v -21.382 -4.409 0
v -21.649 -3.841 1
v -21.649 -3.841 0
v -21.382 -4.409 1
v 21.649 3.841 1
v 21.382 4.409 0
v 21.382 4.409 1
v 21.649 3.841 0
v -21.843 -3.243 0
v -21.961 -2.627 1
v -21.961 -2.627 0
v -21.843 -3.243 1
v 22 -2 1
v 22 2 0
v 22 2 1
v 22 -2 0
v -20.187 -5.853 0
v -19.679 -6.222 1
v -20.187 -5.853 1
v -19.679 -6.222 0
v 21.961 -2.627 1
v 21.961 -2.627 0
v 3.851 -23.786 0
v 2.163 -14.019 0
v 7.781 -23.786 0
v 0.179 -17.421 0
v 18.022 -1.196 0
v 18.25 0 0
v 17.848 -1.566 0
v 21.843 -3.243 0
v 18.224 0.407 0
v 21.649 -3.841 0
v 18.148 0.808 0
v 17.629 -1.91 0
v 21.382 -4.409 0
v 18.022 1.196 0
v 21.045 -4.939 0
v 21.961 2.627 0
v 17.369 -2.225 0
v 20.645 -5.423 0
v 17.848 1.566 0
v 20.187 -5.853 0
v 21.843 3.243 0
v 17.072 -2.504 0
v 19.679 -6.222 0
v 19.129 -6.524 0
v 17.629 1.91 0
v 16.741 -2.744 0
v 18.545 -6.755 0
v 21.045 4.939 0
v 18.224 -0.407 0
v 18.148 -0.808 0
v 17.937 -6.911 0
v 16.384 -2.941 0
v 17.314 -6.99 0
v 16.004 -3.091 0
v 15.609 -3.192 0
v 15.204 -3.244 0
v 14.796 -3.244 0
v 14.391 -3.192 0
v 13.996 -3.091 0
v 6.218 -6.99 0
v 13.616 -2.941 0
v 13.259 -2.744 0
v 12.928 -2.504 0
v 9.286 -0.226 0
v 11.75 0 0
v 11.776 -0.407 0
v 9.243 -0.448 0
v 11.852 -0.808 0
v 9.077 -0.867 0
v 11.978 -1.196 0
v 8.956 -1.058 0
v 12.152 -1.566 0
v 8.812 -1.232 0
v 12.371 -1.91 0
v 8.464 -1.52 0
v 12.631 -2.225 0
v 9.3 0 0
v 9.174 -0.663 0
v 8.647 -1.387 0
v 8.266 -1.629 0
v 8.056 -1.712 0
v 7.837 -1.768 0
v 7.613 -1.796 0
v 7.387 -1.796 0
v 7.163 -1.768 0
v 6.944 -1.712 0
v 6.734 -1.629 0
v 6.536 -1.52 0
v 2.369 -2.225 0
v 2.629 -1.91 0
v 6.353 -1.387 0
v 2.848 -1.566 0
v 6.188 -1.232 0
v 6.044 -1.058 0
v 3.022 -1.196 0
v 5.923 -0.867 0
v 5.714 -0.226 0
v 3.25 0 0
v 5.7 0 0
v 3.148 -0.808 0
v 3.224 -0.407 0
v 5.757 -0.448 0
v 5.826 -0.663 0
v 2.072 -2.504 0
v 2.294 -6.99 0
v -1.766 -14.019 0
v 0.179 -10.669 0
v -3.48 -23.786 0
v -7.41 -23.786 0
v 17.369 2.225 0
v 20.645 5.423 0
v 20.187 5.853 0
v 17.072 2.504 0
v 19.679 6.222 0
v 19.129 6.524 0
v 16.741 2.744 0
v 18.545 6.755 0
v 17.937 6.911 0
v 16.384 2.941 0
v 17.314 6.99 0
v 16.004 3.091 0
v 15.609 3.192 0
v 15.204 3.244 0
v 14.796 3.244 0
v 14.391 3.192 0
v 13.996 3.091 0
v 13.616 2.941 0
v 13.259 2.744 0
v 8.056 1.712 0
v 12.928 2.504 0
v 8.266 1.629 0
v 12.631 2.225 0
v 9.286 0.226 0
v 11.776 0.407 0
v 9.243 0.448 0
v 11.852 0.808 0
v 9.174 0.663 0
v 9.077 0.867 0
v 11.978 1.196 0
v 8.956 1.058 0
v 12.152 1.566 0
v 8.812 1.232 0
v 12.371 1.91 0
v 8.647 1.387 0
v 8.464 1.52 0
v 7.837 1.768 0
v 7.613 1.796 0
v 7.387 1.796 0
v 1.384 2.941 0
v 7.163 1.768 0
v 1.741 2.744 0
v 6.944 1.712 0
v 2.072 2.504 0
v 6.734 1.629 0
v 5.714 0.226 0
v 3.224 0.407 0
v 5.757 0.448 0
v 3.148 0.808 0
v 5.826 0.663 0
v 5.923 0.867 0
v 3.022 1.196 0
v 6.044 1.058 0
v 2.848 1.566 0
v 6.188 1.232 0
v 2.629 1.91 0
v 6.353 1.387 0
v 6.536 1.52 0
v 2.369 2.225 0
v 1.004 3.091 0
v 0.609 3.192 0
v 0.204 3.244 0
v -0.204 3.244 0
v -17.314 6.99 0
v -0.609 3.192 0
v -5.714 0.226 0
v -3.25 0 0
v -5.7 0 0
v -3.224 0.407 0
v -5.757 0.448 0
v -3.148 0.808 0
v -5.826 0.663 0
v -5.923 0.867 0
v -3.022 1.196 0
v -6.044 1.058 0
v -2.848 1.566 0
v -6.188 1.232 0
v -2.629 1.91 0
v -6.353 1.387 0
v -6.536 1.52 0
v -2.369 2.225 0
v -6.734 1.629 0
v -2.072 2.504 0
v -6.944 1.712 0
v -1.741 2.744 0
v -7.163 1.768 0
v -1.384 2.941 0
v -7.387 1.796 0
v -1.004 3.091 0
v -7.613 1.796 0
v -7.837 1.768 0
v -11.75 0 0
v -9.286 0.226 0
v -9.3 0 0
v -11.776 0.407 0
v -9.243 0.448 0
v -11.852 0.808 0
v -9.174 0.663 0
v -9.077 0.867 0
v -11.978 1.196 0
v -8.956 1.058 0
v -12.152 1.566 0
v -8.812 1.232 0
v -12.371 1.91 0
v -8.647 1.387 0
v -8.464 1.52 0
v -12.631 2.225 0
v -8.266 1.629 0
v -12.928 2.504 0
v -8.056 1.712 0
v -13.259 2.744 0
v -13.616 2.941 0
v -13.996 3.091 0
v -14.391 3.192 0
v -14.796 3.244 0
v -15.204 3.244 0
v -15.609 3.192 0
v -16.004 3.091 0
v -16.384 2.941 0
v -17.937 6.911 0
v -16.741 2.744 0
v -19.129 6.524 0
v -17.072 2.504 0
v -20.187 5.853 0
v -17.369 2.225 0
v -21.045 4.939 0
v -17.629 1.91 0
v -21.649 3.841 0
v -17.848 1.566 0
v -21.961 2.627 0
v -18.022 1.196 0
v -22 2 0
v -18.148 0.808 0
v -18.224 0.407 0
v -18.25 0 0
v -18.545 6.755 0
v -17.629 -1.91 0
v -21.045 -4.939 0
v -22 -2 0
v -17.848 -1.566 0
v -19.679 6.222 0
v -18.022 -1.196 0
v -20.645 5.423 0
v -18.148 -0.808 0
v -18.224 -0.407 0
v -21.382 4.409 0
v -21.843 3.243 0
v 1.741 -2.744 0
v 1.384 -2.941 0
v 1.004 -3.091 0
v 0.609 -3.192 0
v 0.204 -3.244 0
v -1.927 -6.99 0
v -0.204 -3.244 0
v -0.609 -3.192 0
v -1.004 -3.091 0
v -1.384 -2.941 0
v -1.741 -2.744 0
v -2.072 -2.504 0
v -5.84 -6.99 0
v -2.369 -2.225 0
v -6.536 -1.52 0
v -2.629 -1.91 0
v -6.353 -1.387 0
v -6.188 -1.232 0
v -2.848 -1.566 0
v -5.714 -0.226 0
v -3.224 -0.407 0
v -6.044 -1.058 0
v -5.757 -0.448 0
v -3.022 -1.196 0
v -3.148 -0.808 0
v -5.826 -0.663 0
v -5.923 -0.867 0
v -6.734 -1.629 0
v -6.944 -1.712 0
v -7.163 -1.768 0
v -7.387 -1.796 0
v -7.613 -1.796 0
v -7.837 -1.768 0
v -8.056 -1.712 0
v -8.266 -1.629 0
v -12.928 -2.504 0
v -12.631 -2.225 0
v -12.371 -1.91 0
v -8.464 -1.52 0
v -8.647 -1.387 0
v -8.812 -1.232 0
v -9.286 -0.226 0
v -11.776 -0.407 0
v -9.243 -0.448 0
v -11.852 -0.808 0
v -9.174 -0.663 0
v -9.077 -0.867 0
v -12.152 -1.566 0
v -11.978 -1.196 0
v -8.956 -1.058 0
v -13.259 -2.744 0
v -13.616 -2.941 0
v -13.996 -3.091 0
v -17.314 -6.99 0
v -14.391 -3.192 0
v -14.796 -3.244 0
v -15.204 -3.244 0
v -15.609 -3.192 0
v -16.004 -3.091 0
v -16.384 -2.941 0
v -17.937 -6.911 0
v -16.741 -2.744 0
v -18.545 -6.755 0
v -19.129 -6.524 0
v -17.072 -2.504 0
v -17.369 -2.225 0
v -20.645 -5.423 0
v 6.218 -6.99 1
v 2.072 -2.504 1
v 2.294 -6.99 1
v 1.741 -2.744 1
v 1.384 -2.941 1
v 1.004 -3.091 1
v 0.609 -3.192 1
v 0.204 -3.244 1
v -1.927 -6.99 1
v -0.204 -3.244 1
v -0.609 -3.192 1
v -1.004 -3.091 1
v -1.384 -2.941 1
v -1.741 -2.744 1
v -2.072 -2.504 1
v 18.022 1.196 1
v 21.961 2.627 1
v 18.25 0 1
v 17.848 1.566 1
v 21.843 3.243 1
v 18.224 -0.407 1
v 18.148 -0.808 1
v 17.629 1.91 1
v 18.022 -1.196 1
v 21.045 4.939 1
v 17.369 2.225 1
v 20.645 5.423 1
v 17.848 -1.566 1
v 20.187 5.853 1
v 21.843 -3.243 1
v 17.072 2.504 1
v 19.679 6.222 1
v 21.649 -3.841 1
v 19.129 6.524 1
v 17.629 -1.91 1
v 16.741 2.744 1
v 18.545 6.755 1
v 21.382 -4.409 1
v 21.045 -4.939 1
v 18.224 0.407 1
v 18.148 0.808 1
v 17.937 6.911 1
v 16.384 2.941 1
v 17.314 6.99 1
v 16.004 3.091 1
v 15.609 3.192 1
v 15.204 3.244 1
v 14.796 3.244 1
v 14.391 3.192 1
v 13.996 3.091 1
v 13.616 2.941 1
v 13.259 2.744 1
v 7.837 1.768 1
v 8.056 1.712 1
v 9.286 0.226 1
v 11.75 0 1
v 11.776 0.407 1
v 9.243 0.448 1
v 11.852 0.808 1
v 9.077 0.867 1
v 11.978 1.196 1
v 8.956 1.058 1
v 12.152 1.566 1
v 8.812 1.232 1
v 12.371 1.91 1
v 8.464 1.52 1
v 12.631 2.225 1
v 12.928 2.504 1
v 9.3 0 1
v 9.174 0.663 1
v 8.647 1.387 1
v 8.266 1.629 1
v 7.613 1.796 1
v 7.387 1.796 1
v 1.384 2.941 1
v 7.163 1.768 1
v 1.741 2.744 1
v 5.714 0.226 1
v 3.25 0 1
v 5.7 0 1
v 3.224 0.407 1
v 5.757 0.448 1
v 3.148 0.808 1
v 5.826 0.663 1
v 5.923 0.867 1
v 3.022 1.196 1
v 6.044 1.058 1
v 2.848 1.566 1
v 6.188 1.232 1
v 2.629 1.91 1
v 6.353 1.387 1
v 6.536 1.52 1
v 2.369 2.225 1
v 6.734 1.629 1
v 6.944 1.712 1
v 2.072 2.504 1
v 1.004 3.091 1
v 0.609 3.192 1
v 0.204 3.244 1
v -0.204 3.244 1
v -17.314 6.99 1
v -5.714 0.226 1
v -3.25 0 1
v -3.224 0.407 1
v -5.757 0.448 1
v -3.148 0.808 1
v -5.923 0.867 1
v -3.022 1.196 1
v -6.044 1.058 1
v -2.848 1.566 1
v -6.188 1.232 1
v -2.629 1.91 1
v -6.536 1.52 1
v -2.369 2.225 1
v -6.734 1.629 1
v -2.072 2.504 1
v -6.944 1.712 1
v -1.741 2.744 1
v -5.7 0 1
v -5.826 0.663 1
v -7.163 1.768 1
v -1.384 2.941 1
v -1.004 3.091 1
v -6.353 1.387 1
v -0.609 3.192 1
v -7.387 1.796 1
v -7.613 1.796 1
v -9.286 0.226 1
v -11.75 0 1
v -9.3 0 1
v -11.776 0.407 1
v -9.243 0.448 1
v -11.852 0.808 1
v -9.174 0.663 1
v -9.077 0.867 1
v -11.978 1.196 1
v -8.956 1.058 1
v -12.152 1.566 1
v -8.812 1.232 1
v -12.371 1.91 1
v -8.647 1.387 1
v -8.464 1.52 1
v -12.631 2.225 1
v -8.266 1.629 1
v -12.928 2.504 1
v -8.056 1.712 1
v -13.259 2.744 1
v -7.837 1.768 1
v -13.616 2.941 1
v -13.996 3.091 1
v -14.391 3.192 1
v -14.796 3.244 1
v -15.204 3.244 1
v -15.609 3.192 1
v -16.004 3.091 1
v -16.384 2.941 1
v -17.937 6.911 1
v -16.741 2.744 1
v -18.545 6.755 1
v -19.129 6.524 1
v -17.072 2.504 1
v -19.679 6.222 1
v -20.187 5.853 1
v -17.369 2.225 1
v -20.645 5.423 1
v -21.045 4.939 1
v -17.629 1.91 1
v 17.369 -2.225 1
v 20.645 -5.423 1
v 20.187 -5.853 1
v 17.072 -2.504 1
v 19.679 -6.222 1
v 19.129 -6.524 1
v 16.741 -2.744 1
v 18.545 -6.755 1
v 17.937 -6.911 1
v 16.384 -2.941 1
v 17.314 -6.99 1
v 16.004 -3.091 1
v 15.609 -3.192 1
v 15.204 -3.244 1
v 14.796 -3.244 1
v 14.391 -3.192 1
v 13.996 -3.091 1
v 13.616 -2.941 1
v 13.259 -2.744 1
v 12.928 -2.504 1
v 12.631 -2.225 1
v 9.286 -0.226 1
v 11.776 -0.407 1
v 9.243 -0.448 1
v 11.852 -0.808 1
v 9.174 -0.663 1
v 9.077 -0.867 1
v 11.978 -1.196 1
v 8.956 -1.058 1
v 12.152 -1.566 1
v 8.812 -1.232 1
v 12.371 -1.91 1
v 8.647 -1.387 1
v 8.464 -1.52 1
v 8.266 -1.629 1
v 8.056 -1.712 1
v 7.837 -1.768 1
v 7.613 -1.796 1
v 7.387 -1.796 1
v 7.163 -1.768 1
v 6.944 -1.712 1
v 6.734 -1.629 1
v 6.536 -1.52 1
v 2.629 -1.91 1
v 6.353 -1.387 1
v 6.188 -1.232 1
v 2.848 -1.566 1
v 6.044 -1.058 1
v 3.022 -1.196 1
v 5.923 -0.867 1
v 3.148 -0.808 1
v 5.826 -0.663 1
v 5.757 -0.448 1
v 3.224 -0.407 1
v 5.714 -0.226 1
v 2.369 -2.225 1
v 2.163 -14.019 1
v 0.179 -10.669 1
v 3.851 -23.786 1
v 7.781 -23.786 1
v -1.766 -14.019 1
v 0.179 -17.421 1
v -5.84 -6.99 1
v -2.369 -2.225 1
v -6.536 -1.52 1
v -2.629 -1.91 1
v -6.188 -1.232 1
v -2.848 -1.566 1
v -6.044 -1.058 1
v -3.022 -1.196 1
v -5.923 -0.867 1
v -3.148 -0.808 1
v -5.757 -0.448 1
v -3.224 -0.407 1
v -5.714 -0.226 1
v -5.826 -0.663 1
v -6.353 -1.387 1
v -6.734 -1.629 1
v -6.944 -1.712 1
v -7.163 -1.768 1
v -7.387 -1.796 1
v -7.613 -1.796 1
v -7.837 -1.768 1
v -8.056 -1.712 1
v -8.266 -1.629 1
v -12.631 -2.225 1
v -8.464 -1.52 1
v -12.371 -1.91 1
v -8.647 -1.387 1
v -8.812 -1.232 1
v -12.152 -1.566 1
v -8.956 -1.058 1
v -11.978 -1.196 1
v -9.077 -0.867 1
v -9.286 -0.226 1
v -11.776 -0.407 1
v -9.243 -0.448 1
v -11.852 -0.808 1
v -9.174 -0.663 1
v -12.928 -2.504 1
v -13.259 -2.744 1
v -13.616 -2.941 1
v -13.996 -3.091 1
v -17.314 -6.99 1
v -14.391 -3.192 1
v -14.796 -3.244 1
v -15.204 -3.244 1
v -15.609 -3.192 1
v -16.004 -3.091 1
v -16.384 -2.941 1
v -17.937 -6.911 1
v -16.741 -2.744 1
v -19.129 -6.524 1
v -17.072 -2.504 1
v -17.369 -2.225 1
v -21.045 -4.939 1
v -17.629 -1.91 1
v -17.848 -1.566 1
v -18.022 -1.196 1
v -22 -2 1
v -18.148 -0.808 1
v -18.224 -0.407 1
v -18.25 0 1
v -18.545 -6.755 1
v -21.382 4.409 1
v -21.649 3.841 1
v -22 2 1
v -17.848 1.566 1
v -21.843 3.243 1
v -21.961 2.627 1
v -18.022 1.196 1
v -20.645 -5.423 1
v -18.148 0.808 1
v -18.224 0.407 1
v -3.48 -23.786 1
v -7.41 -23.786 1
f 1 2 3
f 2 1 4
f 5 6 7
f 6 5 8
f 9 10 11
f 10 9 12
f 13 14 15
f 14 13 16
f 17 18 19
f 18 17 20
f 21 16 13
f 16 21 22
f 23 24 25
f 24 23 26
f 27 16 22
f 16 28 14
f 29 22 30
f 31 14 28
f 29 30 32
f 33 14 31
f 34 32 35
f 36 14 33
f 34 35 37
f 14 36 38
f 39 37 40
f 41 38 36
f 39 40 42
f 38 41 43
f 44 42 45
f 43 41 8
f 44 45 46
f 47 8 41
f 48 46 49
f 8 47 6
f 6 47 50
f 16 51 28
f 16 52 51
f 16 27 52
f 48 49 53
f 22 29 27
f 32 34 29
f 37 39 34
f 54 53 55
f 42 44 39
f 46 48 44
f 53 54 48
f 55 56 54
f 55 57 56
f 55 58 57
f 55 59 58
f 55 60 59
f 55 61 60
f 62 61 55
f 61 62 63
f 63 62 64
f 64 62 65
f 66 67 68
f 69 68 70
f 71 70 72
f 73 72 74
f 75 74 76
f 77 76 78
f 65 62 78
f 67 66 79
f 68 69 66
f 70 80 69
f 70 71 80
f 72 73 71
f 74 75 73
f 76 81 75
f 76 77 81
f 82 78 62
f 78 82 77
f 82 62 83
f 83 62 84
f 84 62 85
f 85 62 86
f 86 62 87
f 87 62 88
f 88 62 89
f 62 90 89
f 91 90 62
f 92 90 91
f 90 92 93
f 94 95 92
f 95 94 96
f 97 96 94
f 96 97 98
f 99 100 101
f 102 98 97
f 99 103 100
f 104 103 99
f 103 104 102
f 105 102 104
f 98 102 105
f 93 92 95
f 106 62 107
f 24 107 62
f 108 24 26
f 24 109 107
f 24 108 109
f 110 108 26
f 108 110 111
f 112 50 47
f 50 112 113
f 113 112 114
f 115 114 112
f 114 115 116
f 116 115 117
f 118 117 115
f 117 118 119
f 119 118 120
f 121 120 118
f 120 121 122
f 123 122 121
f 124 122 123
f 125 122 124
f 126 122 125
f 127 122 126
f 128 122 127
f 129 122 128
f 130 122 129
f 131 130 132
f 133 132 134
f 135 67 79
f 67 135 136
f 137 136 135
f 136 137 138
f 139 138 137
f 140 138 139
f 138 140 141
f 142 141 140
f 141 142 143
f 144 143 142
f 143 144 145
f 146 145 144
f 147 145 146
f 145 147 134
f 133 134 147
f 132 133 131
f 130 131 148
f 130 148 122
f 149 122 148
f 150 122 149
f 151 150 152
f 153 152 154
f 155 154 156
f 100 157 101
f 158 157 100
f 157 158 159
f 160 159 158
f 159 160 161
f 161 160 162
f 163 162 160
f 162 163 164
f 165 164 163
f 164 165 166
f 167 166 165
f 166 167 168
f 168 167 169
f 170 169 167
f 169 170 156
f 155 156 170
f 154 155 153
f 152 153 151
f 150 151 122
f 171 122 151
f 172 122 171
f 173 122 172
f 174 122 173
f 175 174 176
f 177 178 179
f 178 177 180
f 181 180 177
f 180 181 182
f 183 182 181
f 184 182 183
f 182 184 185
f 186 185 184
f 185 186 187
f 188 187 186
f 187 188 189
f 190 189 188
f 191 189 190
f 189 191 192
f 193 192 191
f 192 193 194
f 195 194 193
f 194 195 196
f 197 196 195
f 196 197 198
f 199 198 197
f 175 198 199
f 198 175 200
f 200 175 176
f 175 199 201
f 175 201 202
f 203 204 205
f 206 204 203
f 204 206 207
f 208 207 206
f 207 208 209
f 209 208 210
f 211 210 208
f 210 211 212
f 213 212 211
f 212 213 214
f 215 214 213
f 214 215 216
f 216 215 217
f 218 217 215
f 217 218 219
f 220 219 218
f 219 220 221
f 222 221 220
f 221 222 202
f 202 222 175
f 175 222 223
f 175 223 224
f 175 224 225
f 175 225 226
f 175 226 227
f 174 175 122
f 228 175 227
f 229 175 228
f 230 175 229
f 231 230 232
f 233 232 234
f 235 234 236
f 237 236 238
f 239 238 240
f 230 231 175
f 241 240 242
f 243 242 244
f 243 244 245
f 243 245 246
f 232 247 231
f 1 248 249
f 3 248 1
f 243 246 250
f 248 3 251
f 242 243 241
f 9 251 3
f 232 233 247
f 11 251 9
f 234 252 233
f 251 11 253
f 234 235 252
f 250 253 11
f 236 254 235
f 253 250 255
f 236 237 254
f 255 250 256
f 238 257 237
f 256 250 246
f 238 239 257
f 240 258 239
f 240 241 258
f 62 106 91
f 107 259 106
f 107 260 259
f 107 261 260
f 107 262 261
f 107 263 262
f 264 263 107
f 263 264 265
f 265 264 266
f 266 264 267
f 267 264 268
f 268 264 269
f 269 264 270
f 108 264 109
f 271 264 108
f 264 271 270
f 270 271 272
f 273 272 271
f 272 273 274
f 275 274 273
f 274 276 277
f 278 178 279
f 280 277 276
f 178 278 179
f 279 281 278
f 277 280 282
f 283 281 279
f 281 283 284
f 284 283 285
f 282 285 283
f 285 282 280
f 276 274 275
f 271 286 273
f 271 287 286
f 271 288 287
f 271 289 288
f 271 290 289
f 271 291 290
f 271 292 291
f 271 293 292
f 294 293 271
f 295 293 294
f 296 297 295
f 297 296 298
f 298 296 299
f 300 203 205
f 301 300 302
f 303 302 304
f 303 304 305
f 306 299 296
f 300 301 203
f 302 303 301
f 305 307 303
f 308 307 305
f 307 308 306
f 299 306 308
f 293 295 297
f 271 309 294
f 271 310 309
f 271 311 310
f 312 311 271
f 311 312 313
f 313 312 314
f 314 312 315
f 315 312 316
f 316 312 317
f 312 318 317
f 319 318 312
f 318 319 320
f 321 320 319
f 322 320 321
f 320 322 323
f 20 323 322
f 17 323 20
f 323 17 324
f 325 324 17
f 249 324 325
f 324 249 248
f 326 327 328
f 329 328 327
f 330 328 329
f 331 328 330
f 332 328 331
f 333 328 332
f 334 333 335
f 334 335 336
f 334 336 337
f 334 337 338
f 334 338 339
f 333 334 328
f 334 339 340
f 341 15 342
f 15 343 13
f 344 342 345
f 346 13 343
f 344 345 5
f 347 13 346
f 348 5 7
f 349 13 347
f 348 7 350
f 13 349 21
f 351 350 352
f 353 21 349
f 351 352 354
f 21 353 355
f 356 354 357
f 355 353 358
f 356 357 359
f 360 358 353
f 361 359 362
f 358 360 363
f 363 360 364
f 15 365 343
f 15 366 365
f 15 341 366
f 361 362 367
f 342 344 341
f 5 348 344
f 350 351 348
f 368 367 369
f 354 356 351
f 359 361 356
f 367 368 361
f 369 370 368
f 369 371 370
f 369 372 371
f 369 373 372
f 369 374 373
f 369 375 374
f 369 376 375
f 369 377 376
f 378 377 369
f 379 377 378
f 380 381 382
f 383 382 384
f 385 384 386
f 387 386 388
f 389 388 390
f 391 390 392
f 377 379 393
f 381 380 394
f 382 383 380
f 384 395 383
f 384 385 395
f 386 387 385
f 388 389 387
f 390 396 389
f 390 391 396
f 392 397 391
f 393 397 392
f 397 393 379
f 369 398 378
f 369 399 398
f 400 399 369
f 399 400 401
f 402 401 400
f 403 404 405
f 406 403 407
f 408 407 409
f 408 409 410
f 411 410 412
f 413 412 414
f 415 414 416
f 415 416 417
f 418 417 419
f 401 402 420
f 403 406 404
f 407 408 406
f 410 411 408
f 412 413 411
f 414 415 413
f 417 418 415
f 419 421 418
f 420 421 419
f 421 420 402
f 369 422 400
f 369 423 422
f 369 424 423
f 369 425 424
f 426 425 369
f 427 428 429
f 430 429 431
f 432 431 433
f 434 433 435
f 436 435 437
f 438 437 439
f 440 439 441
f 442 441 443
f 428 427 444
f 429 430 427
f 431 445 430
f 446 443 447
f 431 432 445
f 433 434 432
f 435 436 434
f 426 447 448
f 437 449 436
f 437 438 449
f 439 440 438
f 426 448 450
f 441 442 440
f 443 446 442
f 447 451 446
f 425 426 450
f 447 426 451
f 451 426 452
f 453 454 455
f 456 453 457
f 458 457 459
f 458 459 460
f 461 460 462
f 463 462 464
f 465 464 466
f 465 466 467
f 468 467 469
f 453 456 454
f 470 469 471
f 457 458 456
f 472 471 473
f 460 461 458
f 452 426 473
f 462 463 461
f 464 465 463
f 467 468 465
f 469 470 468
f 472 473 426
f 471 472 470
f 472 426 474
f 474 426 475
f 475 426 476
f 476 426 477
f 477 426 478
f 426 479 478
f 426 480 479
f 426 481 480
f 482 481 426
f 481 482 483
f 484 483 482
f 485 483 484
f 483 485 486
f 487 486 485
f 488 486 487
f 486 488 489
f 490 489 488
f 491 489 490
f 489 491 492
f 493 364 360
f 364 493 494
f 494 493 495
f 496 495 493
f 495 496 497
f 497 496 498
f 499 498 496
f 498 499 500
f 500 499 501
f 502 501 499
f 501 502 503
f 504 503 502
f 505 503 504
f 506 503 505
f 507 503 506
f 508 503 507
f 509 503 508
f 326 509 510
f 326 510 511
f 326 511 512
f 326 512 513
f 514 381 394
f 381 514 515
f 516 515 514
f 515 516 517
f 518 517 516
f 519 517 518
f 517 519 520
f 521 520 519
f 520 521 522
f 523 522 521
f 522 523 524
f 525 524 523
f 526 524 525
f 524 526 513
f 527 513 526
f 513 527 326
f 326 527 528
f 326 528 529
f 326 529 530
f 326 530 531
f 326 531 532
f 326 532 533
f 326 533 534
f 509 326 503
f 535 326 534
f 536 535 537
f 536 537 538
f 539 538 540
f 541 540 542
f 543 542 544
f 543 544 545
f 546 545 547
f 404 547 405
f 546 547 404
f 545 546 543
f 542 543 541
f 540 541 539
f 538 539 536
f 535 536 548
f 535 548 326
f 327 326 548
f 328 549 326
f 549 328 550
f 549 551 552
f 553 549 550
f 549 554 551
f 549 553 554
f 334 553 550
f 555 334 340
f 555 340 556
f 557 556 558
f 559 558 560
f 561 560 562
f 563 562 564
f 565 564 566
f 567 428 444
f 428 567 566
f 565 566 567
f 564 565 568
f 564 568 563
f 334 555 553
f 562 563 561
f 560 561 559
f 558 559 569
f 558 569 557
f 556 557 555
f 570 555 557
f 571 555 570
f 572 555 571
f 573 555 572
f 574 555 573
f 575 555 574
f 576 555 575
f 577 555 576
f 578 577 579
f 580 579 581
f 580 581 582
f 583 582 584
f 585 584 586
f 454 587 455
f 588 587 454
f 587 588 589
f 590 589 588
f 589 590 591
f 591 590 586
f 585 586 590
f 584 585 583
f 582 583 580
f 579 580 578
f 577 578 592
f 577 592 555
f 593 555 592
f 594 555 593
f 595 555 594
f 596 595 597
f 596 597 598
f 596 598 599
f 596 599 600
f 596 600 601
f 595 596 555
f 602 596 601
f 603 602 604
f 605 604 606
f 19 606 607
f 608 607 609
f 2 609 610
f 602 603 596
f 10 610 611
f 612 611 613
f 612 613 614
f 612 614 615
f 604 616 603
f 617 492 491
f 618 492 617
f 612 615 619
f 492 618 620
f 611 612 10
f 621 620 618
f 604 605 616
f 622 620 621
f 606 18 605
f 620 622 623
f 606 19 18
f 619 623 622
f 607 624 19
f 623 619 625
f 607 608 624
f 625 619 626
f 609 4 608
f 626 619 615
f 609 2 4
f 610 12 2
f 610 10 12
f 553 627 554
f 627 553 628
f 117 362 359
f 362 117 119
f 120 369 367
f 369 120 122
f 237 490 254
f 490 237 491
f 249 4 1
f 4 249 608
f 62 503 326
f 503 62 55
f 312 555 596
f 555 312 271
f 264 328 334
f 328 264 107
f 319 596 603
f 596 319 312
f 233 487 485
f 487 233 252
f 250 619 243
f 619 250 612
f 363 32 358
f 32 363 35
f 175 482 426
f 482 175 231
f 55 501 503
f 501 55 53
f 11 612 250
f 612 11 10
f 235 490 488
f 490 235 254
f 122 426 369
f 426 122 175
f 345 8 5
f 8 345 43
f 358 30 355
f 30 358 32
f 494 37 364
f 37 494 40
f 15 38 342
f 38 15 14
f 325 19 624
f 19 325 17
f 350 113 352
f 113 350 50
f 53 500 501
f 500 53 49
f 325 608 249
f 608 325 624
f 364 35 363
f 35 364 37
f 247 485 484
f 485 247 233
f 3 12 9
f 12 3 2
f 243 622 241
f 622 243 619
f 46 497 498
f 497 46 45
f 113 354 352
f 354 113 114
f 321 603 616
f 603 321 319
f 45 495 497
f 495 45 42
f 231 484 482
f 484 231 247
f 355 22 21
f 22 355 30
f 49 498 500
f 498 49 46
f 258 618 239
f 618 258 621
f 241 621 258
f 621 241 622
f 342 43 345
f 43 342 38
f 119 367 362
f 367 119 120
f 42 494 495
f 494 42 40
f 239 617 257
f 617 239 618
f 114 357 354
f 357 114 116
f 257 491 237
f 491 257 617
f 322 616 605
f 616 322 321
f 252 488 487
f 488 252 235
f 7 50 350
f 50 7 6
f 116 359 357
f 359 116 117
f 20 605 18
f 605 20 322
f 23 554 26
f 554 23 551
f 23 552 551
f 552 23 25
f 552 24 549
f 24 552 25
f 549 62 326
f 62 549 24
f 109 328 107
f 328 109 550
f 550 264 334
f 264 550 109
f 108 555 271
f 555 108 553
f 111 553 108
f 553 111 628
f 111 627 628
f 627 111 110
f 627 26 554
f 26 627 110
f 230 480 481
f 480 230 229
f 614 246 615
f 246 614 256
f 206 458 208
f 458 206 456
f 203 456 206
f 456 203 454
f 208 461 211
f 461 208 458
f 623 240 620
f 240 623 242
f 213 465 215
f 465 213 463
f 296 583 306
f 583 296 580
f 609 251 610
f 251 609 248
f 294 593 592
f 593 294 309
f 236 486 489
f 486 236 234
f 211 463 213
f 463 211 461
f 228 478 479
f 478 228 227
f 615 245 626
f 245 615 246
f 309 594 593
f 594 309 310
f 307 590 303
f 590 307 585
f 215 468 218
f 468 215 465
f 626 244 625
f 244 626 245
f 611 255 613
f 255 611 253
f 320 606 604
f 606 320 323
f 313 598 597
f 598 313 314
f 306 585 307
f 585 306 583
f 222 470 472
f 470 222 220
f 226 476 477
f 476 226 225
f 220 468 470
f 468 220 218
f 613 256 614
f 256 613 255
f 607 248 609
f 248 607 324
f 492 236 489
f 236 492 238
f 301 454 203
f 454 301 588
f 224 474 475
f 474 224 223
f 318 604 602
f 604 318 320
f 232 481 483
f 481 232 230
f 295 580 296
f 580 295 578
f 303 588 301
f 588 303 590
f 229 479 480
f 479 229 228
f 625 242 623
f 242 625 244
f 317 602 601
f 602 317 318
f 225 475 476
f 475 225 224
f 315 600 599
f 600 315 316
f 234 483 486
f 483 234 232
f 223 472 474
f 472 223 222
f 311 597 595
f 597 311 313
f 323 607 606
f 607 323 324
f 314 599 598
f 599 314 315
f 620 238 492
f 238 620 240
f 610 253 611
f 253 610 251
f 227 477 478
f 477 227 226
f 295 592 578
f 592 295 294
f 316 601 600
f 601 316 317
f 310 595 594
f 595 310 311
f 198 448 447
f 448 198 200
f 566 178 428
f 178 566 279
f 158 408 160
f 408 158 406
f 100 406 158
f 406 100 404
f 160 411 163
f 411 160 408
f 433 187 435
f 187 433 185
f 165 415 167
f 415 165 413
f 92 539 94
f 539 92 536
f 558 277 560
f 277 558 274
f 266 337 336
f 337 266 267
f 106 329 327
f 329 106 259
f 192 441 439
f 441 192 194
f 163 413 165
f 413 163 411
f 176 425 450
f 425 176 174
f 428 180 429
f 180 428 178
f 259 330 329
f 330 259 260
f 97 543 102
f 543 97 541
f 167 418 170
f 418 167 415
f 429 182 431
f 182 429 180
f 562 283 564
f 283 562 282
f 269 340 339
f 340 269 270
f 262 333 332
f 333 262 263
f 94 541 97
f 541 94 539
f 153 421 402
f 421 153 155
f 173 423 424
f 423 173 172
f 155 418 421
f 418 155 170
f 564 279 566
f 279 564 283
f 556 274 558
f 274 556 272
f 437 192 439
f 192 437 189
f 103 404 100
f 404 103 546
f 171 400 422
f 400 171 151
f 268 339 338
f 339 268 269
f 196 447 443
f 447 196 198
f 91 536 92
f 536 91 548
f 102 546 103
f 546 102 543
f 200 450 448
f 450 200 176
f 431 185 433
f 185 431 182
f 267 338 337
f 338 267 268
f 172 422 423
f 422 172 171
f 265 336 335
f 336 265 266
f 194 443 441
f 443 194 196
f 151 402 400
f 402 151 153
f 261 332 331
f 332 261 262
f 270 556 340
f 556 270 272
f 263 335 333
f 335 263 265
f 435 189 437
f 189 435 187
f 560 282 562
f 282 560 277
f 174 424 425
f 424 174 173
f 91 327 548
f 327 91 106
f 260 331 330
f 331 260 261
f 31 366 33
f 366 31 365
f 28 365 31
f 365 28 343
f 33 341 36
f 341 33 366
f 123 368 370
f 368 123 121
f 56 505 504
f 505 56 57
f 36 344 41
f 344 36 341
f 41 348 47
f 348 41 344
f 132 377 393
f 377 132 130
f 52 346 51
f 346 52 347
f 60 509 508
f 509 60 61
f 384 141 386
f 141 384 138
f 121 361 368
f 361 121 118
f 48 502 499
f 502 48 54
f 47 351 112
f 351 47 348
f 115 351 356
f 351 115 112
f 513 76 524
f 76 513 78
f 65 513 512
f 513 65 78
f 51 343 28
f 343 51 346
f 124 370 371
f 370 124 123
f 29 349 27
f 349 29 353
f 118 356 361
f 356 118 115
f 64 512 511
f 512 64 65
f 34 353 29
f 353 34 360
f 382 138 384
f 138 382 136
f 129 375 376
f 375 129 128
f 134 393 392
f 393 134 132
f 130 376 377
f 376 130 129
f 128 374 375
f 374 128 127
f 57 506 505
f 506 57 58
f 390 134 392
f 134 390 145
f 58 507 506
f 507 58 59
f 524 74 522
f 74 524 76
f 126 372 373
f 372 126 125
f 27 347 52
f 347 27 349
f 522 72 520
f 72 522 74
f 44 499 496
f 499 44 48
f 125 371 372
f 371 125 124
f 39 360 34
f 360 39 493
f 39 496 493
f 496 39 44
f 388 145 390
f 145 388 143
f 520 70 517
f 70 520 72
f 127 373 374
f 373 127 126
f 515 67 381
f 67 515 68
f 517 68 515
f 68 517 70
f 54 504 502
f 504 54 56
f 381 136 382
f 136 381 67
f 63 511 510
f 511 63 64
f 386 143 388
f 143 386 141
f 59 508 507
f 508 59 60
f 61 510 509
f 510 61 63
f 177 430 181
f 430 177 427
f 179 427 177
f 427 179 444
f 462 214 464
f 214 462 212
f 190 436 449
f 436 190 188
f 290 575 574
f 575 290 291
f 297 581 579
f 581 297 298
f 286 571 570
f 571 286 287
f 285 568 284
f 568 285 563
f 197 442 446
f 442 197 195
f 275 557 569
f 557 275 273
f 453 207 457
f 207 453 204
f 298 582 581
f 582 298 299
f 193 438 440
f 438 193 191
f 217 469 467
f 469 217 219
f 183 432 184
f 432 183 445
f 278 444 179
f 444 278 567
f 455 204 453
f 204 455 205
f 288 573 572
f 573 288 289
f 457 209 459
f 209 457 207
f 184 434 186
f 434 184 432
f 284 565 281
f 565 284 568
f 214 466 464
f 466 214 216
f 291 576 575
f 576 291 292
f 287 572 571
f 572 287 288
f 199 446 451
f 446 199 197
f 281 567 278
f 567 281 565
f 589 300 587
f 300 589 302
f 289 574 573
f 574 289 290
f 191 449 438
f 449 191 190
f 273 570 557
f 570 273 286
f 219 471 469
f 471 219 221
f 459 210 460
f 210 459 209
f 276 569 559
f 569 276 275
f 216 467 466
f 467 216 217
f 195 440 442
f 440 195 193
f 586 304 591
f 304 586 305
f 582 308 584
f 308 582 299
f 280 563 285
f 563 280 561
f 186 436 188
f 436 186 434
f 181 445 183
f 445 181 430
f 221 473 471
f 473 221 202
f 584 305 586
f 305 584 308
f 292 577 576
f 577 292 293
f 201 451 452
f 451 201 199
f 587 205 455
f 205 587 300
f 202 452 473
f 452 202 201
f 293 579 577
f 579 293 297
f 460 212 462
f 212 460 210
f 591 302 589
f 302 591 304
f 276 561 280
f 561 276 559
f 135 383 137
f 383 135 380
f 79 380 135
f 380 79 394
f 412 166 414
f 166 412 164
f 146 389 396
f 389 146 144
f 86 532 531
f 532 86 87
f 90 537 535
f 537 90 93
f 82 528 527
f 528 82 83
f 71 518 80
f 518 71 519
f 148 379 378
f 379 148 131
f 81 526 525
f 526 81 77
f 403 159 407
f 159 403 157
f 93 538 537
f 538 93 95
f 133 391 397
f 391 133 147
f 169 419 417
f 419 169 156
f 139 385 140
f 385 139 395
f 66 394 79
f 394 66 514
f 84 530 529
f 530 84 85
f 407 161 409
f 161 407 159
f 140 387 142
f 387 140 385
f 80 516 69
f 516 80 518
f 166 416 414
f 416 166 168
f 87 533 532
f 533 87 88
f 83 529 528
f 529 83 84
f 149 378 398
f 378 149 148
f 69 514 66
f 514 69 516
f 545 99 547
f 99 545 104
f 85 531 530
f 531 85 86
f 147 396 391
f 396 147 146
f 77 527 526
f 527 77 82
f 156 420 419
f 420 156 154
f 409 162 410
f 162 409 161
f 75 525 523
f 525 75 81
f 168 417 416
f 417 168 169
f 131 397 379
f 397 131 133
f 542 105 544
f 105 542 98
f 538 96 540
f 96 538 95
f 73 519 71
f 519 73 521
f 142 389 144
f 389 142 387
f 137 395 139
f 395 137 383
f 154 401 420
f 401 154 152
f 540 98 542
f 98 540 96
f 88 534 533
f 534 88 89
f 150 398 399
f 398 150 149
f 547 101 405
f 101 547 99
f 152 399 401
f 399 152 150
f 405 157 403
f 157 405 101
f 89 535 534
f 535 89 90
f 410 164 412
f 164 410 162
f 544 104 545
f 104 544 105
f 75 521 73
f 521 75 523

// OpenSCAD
$fn = 50;


difference() {
	union() {
		hull() {
			translate(v = [-17.0000000000, 2.0000000000, 0]) {
				cylinder(h = 1, r = 5);
			}
			translate(v = [17.0000000000, 2.0000000000, 0]) {
				cylinder(h = 1, r = 5);
			}
			translate(v = [-17.0000000000, -2.0000000000, 0]) {
				cylinder(h = 1, r = 5);
			}
			translate(v = [17.0000000000, -2.0000000000, 0]) {
				cylinder(h = 1, r = 5);
			}
		}
		translate(v = [0, -5, 0]) {
			linear_extrude(height = 1) {
				text(font = "DejaVu Sans Mono:style=Bold", halign = "center", size = 19.0000000000, text = "X", valign = "top");
			}
		}
	}
	union() {
		translate(v = [-15.0000000000, 0.0000000000, 0]) {
			translate(v = [0, 0, -100]) {
				cylinder(h = 200, r = 3.2500000000);
			}
		}
		translate(v = [0, 0, -100]) {
			cylinder(h = 200, r = 3.2500000000);
		}
		translate(v = [15.0000000000, 0.0000000000, 0]) {
			translate(v = [0, 0, -100]) {
				cylinder(h = 200, r = 3.2500000000);
			}
		}
		translate(v = [-15.0000000000, 0.0000000000, 0]) {
			translate(v = [0, 0, -100]) {
				cylinder(h = 200, r = 1.8000000000);
			}
		}
		translate(v = [-7.5000000000, 0.0000000000, 0]) {
			translate(v = [0, 0, -100]) {
				cylinder(h = 200, r = 1.8000000000);
			}
		}
		translate(v = [0, 0, -100]) {
			cylinder(h = 200, r = 1.8000000000);
		}
		translate(v = [7.5000000000, 0.0000000000, 0]) {
			translate(v = [0, 0, -100]) {
				cylinder(h = 200, r = 1.8000000000);
			}
		}
		translate(v = [15.0000000000, 0.0000000000, 0]) {
			translate(v = [0, 0, -100]) {
				cylinder(h = 200, r = 1.8000000000);
			}
		}
	}
}
